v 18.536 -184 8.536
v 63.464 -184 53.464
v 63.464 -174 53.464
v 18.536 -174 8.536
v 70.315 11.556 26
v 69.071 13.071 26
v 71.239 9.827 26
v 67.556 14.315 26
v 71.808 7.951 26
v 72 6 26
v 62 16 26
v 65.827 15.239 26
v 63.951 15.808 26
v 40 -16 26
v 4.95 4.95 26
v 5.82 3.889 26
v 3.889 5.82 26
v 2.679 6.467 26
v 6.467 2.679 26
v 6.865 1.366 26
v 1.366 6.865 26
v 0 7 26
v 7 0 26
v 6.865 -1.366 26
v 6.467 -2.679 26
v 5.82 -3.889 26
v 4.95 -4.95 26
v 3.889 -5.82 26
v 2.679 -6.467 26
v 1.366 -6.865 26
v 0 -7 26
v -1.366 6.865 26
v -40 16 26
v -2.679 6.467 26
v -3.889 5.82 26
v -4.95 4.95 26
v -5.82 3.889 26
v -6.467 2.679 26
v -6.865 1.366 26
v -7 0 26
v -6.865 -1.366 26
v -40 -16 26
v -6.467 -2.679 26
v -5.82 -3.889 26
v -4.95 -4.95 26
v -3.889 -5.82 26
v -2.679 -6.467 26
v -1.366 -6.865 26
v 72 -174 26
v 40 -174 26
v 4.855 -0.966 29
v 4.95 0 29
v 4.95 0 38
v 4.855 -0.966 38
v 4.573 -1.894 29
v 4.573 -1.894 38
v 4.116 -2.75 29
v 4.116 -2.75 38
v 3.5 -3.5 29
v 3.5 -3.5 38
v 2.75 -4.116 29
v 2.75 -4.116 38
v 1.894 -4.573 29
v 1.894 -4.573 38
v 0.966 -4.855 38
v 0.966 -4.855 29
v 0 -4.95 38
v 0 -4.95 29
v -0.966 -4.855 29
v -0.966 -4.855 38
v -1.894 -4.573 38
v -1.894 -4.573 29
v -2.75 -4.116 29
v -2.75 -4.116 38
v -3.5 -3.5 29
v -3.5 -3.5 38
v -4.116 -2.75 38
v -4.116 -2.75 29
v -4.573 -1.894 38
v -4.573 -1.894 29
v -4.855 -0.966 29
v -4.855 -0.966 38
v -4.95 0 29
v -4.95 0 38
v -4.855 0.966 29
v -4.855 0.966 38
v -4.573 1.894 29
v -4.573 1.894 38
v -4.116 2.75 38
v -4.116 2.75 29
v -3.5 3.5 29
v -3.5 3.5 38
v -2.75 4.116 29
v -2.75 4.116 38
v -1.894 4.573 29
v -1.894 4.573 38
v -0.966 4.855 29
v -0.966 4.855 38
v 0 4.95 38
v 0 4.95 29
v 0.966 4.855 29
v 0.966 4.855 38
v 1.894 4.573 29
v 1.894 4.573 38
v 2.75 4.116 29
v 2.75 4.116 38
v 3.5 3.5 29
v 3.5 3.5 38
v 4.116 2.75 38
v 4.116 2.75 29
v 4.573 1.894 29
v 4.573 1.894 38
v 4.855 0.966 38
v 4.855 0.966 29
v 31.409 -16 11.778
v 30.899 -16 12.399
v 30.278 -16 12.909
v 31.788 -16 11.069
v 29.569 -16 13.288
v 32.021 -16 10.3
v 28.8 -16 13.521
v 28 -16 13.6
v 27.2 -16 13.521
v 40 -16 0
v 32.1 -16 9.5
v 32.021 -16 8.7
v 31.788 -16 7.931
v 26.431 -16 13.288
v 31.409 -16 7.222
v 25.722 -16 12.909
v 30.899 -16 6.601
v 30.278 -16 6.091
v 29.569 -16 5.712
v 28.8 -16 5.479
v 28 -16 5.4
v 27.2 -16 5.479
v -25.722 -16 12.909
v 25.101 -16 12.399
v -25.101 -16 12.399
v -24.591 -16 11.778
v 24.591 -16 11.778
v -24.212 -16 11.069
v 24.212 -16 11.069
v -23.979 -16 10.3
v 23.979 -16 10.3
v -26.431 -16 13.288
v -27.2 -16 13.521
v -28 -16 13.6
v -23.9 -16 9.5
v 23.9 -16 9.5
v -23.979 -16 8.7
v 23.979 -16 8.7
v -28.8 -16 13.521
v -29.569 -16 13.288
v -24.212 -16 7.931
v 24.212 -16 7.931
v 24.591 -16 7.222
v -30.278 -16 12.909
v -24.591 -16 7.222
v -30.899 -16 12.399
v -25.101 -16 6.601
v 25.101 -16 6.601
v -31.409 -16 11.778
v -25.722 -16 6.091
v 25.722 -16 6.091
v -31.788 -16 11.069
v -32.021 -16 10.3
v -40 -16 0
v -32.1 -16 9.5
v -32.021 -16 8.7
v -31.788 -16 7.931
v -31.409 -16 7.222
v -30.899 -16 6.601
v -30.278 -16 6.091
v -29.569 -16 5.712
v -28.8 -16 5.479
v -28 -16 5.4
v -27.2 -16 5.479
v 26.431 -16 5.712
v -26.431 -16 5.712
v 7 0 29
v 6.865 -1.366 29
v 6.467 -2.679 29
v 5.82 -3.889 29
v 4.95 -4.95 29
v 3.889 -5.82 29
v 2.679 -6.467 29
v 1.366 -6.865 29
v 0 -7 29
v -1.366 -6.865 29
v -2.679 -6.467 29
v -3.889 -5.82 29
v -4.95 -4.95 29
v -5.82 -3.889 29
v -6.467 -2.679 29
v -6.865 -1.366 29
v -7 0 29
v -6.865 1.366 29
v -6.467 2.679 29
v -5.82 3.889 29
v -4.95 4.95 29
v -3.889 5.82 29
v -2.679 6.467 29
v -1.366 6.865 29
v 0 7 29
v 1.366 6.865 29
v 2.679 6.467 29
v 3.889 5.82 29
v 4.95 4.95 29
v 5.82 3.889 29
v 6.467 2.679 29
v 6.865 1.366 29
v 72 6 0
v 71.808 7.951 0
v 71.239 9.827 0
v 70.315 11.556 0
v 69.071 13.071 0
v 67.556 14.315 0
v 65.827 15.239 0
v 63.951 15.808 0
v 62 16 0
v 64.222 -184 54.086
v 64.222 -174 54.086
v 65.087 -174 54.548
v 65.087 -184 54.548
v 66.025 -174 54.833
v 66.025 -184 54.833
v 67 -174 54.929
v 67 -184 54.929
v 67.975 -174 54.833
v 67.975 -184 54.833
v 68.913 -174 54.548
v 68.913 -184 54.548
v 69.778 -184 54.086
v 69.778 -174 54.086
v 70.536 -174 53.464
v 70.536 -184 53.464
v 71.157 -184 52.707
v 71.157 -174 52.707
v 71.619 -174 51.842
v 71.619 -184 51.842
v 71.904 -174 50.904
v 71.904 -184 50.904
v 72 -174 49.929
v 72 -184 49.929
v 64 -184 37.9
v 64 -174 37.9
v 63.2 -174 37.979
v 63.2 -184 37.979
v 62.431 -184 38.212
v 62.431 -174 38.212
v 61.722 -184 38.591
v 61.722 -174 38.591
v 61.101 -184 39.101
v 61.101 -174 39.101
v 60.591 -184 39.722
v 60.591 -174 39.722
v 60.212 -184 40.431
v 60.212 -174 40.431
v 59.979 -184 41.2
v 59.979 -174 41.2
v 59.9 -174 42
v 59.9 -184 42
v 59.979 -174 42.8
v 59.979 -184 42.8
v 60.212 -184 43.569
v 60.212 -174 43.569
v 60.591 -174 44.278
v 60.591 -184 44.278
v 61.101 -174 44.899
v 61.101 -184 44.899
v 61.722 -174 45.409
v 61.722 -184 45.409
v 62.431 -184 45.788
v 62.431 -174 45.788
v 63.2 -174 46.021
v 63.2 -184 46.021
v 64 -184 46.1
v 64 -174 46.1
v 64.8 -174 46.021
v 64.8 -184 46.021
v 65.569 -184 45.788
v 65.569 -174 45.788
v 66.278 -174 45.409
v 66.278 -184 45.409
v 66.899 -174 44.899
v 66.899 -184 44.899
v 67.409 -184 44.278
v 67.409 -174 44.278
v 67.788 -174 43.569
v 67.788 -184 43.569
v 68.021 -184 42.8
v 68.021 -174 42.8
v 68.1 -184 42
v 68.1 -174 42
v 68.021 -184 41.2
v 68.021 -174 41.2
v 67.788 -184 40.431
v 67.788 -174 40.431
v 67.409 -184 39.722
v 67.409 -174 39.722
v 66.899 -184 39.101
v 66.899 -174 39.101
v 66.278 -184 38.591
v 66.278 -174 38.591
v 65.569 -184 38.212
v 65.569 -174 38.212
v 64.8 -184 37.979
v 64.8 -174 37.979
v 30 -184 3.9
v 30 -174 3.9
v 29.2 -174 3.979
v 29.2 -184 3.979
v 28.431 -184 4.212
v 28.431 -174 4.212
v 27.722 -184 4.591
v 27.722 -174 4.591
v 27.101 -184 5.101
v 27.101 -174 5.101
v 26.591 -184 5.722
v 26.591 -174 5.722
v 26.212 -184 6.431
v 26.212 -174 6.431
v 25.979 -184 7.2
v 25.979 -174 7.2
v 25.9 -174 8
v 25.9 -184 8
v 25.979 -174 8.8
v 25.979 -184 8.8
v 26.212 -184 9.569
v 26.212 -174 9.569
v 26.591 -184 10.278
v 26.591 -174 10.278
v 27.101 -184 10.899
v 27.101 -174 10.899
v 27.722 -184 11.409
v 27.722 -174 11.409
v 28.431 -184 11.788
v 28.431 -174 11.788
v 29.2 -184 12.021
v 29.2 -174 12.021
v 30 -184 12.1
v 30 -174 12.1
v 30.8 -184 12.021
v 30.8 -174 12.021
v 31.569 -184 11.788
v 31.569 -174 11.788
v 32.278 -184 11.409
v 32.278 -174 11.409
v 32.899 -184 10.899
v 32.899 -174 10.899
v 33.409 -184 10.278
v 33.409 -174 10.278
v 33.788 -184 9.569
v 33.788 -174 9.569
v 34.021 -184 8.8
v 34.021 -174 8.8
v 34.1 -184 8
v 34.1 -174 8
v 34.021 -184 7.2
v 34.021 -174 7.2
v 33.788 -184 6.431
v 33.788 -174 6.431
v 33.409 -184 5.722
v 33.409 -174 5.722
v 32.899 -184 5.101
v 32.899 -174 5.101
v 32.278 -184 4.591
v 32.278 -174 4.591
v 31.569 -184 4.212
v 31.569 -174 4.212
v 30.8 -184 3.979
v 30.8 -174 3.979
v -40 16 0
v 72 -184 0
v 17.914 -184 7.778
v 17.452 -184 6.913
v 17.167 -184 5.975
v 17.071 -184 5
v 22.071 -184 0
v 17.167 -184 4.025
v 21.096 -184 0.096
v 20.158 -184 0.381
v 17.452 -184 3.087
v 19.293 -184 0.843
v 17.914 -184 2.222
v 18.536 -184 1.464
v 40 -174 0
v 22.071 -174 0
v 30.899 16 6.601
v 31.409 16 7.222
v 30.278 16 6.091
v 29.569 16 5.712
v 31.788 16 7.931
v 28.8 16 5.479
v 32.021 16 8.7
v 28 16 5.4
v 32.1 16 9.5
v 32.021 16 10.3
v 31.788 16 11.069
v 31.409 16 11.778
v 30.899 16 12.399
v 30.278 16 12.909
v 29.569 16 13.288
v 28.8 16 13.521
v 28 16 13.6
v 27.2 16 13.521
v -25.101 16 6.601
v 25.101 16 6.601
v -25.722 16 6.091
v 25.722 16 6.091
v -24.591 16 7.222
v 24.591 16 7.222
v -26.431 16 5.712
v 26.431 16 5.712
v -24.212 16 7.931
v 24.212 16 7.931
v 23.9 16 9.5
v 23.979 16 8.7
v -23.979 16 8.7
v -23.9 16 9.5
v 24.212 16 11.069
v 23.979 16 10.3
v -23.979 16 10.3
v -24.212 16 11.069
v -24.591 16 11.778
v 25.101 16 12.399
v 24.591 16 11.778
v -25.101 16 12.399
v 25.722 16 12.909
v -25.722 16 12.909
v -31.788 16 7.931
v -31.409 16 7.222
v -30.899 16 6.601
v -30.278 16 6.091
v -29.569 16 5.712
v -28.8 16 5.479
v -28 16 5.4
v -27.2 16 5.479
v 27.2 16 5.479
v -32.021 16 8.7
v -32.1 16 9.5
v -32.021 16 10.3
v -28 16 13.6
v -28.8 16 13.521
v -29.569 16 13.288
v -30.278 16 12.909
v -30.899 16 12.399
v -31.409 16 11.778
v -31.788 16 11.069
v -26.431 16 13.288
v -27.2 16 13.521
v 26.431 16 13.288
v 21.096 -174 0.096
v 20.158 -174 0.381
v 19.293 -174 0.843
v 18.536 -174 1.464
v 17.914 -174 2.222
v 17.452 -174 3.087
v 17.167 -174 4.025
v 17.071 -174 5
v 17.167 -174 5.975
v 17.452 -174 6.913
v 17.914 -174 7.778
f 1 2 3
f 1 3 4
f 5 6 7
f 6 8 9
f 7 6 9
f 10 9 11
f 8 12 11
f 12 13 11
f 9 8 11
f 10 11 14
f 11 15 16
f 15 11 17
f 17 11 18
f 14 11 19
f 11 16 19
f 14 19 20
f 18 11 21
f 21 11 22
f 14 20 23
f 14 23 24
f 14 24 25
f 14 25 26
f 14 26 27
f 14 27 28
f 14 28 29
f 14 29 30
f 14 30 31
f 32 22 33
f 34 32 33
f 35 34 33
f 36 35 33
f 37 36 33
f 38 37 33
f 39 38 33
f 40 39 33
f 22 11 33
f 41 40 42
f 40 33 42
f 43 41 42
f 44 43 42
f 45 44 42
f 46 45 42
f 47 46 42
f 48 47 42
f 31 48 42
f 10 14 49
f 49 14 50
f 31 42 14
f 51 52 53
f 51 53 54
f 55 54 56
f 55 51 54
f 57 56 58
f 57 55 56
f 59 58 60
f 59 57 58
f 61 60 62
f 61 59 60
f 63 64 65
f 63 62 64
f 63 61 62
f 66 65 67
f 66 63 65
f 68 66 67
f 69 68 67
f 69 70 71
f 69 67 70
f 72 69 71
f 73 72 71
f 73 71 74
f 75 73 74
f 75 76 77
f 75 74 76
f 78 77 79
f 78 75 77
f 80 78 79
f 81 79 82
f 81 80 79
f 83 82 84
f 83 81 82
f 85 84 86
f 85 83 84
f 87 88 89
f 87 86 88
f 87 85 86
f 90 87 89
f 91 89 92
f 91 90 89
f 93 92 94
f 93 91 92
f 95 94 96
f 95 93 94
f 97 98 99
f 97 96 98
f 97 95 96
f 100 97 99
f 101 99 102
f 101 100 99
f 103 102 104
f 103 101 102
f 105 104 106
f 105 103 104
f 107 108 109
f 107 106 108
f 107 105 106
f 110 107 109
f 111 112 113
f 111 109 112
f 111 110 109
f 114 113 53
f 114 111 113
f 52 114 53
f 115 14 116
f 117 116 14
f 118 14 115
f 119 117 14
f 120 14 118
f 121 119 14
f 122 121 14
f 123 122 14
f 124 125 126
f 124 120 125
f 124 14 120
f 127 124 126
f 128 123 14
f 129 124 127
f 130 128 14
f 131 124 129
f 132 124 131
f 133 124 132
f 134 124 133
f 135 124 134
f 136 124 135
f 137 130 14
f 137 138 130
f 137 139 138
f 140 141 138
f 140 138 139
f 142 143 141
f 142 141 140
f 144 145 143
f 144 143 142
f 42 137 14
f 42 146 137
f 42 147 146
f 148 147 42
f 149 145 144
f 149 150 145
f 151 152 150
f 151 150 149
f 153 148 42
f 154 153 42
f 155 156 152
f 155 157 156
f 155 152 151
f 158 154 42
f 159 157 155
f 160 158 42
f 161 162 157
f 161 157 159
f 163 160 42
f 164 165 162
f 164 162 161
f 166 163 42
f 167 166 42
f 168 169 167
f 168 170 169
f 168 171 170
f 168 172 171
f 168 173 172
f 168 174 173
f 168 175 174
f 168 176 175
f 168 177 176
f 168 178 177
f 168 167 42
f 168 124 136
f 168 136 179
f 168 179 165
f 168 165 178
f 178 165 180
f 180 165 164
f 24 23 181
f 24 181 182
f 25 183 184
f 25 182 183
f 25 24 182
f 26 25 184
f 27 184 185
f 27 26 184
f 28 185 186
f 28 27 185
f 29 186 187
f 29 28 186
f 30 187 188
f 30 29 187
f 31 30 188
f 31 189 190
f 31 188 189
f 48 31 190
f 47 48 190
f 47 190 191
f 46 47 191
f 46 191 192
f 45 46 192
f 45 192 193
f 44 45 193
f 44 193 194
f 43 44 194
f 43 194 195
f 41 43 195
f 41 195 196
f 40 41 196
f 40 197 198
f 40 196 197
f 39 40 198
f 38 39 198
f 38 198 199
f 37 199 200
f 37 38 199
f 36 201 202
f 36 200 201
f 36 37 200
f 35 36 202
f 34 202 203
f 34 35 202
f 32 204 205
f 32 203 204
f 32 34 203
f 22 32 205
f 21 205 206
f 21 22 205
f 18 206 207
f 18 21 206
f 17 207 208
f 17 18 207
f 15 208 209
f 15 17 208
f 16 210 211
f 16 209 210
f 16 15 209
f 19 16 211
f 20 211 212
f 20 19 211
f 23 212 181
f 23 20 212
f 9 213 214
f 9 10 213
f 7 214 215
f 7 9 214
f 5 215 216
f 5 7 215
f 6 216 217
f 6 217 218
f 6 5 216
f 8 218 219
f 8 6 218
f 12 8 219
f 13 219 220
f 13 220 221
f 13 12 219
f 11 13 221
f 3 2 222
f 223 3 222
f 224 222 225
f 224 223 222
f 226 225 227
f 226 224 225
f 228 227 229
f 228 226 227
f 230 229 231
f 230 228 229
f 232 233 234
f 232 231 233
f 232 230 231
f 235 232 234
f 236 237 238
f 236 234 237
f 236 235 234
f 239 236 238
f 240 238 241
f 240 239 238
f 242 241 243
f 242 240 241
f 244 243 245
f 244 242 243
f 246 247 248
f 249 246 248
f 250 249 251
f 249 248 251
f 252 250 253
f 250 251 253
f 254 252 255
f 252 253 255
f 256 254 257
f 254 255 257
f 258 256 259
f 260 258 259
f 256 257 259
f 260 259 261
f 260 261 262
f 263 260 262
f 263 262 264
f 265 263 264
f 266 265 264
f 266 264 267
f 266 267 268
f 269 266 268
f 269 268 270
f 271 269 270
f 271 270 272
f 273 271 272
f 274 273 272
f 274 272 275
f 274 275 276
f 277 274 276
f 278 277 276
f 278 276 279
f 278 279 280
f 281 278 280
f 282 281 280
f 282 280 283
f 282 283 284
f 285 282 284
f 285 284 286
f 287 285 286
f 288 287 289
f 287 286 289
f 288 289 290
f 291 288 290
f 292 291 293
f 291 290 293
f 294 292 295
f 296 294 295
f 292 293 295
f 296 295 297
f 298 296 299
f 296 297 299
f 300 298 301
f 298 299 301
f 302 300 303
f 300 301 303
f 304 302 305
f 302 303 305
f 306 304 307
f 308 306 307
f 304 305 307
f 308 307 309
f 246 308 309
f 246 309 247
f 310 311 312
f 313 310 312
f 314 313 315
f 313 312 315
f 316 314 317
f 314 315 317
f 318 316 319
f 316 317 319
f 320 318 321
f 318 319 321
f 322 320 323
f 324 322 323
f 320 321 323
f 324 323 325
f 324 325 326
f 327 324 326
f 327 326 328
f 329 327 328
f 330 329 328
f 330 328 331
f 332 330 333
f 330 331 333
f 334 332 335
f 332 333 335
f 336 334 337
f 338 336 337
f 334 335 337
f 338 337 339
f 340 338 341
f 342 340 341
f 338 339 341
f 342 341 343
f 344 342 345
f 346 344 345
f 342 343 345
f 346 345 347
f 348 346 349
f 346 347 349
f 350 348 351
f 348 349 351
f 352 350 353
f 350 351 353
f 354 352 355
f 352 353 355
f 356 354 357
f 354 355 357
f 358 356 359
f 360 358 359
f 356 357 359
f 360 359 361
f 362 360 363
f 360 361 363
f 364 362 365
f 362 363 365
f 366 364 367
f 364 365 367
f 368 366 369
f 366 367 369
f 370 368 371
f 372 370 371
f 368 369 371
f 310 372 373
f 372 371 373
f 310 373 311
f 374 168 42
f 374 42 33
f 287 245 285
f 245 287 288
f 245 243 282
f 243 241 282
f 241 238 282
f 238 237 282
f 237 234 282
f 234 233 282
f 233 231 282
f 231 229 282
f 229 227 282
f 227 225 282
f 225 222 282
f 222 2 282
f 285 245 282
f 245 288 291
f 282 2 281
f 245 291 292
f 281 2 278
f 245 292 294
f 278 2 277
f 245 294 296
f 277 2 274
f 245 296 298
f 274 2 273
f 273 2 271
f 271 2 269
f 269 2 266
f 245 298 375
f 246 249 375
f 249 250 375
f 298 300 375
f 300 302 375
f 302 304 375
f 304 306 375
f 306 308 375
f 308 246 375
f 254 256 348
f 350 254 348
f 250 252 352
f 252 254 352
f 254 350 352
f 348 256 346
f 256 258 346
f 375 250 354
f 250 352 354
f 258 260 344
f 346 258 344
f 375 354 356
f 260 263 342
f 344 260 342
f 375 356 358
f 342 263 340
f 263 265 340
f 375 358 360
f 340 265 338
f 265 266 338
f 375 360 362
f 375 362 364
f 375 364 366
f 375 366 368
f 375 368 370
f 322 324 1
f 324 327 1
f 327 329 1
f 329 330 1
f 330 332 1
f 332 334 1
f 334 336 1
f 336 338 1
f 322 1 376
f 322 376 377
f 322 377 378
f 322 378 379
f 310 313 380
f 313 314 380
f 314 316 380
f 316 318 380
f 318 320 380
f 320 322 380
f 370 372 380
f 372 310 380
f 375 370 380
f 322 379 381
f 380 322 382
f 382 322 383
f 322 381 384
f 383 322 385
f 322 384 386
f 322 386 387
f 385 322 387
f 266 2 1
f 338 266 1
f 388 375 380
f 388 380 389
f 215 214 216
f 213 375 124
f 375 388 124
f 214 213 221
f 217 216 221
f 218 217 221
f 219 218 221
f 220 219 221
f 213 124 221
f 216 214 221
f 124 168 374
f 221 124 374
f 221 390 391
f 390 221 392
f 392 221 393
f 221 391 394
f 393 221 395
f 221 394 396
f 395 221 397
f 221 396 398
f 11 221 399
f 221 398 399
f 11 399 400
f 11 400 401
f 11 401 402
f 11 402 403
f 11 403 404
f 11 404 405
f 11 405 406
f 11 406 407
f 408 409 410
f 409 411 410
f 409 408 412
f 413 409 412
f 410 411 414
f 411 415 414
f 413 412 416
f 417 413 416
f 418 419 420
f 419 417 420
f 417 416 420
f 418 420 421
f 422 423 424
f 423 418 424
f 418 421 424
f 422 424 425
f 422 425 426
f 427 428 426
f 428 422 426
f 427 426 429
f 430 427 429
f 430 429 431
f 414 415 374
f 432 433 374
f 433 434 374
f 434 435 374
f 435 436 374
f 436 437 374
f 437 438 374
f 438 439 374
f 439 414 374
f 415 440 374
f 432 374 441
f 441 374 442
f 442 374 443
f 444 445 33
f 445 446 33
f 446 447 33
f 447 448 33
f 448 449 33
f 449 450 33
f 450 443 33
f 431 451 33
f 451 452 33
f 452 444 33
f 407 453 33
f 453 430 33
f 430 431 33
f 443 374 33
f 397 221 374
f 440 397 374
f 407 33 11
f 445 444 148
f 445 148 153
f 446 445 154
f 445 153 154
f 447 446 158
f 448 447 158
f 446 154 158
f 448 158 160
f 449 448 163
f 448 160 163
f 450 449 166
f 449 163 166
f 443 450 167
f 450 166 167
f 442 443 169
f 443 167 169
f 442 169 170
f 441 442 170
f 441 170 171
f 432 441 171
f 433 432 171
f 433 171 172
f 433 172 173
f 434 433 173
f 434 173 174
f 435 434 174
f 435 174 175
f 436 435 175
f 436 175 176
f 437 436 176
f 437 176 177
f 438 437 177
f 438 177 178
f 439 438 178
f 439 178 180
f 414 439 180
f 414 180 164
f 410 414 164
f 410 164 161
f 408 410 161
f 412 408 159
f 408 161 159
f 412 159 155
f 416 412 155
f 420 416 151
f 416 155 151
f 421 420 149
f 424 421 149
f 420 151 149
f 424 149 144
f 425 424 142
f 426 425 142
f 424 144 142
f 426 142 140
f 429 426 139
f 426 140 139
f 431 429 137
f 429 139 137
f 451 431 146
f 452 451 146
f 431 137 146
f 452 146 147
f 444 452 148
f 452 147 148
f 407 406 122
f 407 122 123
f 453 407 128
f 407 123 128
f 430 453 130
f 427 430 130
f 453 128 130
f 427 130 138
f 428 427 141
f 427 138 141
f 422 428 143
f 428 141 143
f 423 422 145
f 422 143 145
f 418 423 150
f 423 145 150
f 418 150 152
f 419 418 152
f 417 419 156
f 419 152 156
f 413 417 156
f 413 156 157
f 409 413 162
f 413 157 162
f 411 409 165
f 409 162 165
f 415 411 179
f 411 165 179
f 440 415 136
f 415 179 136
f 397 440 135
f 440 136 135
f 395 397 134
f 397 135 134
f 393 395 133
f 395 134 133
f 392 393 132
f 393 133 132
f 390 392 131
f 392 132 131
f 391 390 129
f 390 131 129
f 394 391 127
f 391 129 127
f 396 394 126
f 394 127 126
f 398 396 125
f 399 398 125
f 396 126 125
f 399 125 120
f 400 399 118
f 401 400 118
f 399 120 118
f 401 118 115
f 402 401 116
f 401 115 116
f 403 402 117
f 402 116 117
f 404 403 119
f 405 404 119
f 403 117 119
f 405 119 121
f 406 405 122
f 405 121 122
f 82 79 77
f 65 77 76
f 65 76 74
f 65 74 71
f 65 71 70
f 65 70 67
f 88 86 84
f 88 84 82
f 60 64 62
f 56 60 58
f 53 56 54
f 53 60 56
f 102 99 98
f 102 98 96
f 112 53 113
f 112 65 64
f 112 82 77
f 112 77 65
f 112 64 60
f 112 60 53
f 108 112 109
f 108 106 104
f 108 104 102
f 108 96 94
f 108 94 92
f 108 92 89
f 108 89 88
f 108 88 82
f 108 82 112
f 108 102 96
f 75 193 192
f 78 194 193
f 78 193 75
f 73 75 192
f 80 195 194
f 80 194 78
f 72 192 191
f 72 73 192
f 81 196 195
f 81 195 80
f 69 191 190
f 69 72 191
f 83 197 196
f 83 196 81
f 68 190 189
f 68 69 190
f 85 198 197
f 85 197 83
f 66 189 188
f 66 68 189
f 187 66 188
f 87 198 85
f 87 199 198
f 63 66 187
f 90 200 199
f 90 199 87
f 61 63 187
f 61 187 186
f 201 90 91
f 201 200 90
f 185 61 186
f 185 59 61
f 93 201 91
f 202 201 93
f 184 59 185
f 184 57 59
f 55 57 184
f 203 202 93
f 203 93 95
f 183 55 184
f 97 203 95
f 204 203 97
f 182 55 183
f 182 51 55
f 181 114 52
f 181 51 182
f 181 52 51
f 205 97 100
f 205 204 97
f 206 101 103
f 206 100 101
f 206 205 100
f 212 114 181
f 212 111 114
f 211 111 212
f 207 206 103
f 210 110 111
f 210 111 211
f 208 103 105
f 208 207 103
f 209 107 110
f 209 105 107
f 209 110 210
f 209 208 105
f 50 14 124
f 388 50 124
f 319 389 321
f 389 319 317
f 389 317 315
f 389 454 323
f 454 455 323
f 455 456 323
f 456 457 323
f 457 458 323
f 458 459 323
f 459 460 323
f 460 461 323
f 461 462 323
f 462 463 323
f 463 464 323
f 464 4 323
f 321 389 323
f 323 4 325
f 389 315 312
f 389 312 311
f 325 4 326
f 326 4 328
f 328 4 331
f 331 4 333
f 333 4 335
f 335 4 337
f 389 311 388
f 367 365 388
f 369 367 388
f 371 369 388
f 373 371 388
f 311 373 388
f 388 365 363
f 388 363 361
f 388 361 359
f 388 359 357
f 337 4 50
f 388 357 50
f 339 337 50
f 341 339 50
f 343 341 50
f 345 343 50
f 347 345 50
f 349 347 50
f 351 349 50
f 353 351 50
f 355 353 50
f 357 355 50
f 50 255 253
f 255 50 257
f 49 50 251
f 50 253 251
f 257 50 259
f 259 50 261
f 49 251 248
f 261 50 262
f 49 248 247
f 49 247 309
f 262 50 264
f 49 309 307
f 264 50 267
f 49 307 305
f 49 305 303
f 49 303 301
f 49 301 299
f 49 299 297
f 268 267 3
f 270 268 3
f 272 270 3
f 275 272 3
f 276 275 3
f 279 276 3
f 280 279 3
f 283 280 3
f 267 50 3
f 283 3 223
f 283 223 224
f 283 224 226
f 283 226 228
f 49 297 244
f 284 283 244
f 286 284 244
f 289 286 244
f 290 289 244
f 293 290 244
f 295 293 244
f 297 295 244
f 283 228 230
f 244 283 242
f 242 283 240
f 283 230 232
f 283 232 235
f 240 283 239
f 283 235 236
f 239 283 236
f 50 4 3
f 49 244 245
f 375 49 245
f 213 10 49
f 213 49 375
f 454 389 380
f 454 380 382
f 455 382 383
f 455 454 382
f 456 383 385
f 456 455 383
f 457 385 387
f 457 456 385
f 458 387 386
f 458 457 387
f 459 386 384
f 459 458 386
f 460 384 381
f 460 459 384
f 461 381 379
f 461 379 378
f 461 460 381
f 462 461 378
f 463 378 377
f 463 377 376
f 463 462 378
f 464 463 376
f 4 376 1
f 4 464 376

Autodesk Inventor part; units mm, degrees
ref_plane "YZ Plane" through (0, 0, 0) normal (1, 0, 0) x (0, 1, 0)
ref_plane "XZ Plane" through (0, 0, 0) normal (0, 1, 0) x (-1, 0, 0)
ref_plane "XY Plane" through (0, 0, 0) normal (0, 0, 1) x (1, 0, 0)
sketch "Sketch2" plane through (0, 0, 0) normal (0, 0, 1) x (1, 0, 0)
  line L0 (-40, 16) -> (40, 16)
  line L1 (40, 16) -> (40, -16)
  line L2 (40, -16) -> (-40, -16)
  line L3 (-40, -16) -> (-40, 16)
  line L4 (-40, 16) -> (40, -16) construction
  line L5 (40, 16) -> (-40, -16) construction
  point P0 (0, 0)
  dimension "d4" = 32
  dimension "d5" = 80
extrude "Extrusion1" add sketch "Sketch2" along normal blind 26
sketch "Sketch3" plane through (0, 0, 26) normal (0, 0, 1) x (1, 0, 0)
  circle A0 centre (0, 0) radius 7
  dimension "d8" = 14
extrude "Extrusion2" add sketch "Sketch3" along normal blind 3
sketch "Sketch4" plane through (0, 0, 29) normal (0, 0, 1) x (1, 0, 0)
  circle A0 centre (0, 0) radius 4.95
  dimension "d11" = 9.9
extrude "Extrusion3" add sketch "Sketch4" along normal blind 9
sketch "Sketch6" plane through (-40, 16, 0) normal (0, 1, 0) x (1, 0, 0)
  line L0 (12, -9.5) -> (0, -9.5) construction
  line L1 (0, 0) -> (0, -26) projected
  line L2 (68, -9.5) -> (80, -9.5) construction
  line L3 (80, 0) -> (80, -26) projected
  line L4 (80, 0) -> (0, 0) projected
  point P0 (40, 0)
  point P1 (74, -9.5)
  dimension "d29" = 56
  dimension "d30" = 9.5
hole "Hole3" at (-28, 16, 9.5) at (28, 16, 9.5) direction (0, -1, 0) diameter 8.2 end through all
sketch "Sketch7" plane through (-40, -16, 0) normal (0, -1, 0) x (1, 0, 0)
  line L0 (80, 0) -> (80, 26) projected
  line L1 (0, 0) -> (0, 26) projected
  line L2 (80, 0) -> (0, 26)
  point P0 (40, 0)
sketch "Sketch9" plane through (40, -16, 0) normal (1, 0, 0) x (0, 0, -1)
  line L0 (0, 0) -> (0, 32) projected
  line L1 (0, 32) -> (-26, 32)
  line L2 (-26, 32) -> (-26, -168)
  line L3 (-26, -168) -> (0, -168)
  line L4 (0, -168) -> (0, 32)
  line L5 (-26, 0) -> (-26, 32) projected
  point P0 (0, 16)
  dimension "d38" = 200
extrude "Extrusion4" add sketch "Sketch9" along normal blind 32
sketch "Sketch11" plane through (40, -184, 0) normal (0, -1, 0) x (1, 0, 0)
  line L0 (32, 0) -> (-30, 0)
  line L1 (32, 62) -> (-30, 0)
  line L2 (32, 0) -> (32, 62)
  point P0 (-40, 0)
  point P1 (0, 0)
  dimension "d43" = 62
  dimension "d44" = 62
extrude "Extrusion5" add sketch "Sketch11" against normal blind 10
fillet "Fillet1" radius 5 2 edges at (10, -179, 0) (72, -179, 62)
sketch "Sketch12" plane through (72, -184, 0) normal (0, -1, 0) x (1, 0, 0)
  line L0 (0, 0) -> (-32, 0)
  line L1 (-32, 0) -> (-32, 32)
  line L2 (-32, 32) -> (0, 32)
  line L3 (0, 32) -> (0, 0)
  circle A0 centre (-44, 9.5) radius 4.1 projected
  line L4 (-49.9289, 0) -> (0, 0) projected
  line L5 (0, 0) -> (0, 49.9289) projected
  point P0 (-72, 0)
  point P1 (-8, 42)
  point P2 (-42, 8)
  dimension "d48" = 32
  dimension "d49" = 32
  dimension "d50" = 8
  dimension "d51" = 10
  dimension "d52" = 10
  dimension "d53" = 8
hole "Hole4" at (64, -184, 42) at (30, -184, 8) direction (0, 1, 0) diameter 8.2 depth 20
fillet "Fillet2" radius 10 1 edges at (72, 16, 13)
properties part number "13042026-06"
